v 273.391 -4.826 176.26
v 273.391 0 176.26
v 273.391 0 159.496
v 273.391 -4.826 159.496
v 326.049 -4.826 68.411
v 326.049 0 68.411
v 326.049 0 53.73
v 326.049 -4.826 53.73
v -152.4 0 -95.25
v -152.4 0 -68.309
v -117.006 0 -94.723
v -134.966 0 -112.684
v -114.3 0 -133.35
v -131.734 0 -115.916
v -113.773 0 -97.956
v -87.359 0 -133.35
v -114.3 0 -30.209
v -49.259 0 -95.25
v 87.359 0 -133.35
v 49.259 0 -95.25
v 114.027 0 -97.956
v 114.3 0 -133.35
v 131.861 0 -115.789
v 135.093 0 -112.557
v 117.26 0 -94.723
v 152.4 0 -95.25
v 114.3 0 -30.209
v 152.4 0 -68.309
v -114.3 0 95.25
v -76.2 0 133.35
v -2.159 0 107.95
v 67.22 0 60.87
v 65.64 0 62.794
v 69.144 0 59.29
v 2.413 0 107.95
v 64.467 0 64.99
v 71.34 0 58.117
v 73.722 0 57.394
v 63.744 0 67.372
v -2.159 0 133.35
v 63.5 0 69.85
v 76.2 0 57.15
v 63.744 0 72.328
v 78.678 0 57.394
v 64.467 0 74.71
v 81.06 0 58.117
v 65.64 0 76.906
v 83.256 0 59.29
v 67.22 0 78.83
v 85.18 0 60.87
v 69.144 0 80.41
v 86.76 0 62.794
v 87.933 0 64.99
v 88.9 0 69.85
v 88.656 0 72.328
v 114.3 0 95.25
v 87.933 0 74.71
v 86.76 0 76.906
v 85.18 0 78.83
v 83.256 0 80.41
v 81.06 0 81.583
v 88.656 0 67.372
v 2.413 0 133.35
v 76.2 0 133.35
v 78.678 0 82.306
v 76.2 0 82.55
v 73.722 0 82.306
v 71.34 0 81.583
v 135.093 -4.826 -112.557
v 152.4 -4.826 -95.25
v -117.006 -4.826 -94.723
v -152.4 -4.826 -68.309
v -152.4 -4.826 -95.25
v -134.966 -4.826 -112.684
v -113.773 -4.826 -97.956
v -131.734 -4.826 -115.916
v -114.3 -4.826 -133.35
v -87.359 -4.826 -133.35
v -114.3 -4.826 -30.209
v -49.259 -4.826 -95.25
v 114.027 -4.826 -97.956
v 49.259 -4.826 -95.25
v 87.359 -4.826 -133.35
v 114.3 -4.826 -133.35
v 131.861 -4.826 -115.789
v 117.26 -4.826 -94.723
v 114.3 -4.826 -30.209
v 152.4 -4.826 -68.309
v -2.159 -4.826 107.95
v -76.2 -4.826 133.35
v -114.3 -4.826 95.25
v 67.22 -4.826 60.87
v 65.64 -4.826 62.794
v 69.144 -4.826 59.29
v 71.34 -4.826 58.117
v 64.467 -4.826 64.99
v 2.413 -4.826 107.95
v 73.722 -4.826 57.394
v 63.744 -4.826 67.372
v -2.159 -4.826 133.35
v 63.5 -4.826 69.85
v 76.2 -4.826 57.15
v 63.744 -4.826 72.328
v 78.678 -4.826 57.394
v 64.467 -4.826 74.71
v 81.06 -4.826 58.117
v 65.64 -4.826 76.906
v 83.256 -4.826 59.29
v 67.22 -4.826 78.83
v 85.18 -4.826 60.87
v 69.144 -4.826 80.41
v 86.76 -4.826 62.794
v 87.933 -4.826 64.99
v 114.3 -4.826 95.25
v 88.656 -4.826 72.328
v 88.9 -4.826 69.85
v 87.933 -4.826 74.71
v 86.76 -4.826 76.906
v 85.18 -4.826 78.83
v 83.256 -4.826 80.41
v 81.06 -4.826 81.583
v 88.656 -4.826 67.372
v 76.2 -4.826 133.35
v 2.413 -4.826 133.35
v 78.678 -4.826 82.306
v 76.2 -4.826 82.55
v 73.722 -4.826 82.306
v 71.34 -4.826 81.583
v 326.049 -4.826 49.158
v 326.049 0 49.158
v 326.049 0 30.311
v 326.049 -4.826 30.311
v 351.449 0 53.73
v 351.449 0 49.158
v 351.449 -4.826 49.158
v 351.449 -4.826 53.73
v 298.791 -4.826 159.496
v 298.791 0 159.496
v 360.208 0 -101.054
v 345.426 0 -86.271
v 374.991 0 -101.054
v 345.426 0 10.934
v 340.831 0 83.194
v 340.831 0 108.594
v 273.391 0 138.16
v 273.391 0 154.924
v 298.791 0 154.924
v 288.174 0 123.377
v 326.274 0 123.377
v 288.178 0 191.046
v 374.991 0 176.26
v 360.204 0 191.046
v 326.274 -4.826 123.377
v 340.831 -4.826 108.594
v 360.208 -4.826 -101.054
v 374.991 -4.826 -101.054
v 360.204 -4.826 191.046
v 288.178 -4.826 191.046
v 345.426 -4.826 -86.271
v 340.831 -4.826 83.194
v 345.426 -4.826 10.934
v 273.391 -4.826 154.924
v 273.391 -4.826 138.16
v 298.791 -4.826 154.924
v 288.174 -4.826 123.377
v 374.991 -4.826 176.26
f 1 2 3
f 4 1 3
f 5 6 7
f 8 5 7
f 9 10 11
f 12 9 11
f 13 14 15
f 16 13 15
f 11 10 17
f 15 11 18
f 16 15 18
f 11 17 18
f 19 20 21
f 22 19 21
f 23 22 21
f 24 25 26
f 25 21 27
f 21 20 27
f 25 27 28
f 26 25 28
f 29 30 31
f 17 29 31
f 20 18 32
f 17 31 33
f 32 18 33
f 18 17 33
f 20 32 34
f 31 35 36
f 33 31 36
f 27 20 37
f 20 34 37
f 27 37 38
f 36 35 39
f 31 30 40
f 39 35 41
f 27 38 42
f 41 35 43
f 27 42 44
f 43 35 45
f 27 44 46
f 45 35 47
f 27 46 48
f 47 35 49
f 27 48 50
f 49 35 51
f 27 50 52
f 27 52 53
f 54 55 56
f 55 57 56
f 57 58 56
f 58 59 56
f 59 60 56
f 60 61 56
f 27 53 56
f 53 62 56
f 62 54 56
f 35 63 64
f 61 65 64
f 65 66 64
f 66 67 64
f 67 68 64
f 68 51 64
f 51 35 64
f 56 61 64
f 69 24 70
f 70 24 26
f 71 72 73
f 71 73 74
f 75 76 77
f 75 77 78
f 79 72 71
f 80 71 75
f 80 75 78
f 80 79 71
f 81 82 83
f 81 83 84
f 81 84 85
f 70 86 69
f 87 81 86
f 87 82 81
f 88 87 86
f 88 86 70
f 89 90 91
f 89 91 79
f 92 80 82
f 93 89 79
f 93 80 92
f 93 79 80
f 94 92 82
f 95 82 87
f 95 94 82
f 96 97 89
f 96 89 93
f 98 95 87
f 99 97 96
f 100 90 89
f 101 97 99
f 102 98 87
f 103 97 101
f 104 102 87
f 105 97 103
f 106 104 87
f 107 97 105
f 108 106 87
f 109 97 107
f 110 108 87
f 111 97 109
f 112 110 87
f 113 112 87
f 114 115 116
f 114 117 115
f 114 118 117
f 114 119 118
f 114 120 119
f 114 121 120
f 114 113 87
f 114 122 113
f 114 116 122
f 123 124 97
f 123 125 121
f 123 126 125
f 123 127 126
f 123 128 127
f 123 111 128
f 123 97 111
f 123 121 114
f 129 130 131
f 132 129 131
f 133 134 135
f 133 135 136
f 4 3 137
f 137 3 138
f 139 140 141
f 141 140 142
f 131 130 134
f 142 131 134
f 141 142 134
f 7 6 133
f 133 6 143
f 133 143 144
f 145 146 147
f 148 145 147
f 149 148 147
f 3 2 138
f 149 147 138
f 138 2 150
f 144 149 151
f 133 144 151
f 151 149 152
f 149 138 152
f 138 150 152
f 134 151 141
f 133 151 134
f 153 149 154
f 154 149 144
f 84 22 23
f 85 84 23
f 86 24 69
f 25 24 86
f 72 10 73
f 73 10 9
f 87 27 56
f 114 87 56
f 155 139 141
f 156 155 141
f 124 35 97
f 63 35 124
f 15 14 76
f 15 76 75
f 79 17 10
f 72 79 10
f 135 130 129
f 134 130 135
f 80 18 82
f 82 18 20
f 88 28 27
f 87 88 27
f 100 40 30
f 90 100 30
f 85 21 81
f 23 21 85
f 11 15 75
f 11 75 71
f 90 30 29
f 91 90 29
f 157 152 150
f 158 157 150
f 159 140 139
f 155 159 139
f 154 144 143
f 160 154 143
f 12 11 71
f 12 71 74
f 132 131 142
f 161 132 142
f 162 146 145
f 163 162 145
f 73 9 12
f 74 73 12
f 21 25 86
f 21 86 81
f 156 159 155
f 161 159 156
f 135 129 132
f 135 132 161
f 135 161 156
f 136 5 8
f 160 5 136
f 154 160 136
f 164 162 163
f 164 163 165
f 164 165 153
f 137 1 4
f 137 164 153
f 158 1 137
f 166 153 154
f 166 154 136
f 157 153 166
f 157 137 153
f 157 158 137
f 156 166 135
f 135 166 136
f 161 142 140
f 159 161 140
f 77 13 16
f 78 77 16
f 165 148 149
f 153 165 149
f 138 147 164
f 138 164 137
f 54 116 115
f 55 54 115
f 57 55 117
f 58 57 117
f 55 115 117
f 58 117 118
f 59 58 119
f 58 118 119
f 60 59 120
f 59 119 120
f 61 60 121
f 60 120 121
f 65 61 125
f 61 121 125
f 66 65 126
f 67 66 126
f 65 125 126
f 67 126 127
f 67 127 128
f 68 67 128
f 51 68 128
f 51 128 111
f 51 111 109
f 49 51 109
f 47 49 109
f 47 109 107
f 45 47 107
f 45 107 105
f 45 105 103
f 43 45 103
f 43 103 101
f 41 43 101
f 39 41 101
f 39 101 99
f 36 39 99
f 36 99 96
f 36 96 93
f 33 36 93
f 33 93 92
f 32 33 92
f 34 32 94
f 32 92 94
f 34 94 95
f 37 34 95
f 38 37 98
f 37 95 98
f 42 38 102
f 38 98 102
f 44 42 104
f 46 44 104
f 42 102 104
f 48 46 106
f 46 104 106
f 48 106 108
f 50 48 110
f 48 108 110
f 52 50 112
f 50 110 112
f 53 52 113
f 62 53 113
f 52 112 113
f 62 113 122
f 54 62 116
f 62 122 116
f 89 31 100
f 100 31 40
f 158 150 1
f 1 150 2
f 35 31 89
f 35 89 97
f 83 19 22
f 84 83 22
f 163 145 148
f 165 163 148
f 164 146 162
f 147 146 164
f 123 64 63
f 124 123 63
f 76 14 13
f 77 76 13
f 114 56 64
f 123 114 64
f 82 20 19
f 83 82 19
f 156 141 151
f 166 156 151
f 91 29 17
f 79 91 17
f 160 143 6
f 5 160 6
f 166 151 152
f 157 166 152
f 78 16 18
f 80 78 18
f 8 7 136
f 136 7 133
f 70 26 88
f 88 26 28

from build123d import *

# Parameters (mm, degrees)
F1_DEPTH = 4.826
F3_DEPTH = 4.826
F4_W     = 4.572
F4_H     = 25.4
F4_W_2   = 25.4
F4_H_2   = 4.572
F5_DEPTH = 4.826
F6_R     = 12.7
F7_DEPTH = 4.827


with BuildPart() as f1:
    # F0 (on Front) → F1 (new body)
    with BuildSketch(Plane.XZ):
        Polygon((114.3, 95.25), (76.2, 133.35), (-76.2, 133.35), (-114.3, 95.25), (-114.3, -30.209232), (-152.4, -68.309232), (-152.4, -95.25), (-114.3, -133.35), (-87.359232, -133.35), (-49.259232, -95.25), (49.259232, -95.25), (87.359232, -133.35), (114.3, -133.35), (152.4, -95.25), (152.4, -68.309232), (114.3, -30.209232), align=None)
    extrude(amount=F1_DEPTH)


with BuildPart() as f3:
    # F2 (on Front) → F3 (new body)
    with BuildSketch(Plane.XZ):
        Polygon((374.99113, 176.2596), (360.204472, 191.046258), (288.177788, 191.046258), (273.39113, 176.2596), (273.39113, 138.1596), (288.17393, 123.3768), (326.27393, 123.3768), (340.831323, 108.594), (340.831323, 83.194), (326.048523, 68.4112), (326.048523, 30.3112), (345.42553, 10.934193), (345.42553, -86.270942), (360.20833, -101.053742), (374.99113, -101.053742), align=None)
    extrude(amount=F3_DEPTH)


with BuildPart() as f5_tool:
    # F4 (on Front) → F5 (new body, through all)
    with BuildSketch(Plane.XZ):
        with Locations((0.127, 120.65)):
            Rectangle(F4_W, F4_H)
        Polygon((-134.966446, -112.683554), (-131.733554, -115.916446), (-113.773042, -97.955934), (-117.005934, -94.723042), align=None)
        Polygon((114.027042, -97.955934), (131.860554, -115.789446), (135.093446, -112.556554), (117.259934, -94.723042), align=None)
        Polygon((135.093446, -112.556554), (131.860554, -115.789446), (131.987554, -115.916446), (135.220446, -112.683554), align=None)
        with Locations((286.09113, 157.2096)):
            Rectangle(F4_W_2, F4_H_2)
        with Locations((338.748523, 51.444)):
            Rectangle(F4_W_2, F4_H_2)
    extrude(amount=F5_DEPTH)


with BuildPart() as f1_1:
    add(f1.part)

    # F5: cut by f5_tool
    add(f5_tool.part, mode=Mode.SUBTRACT)

    # F6 (on face) → F7 (cut, through all)
    with BuildSketch(Plane.XZ.offset(4.826)):
        with Locations((76.2, 69.85)):
            Circle(F6_R)
    extrude(amount=-F7_DEPTH, mode=Mode.SUBTRACT)


with BuildPart() as f3_1:
    add(f3.part)

    # F5: cut by f5_tool
    add(f5_tool.part, mode=Mode.SUBTRACT)


solid = Compound([f1_1.part, f3_1.part])
